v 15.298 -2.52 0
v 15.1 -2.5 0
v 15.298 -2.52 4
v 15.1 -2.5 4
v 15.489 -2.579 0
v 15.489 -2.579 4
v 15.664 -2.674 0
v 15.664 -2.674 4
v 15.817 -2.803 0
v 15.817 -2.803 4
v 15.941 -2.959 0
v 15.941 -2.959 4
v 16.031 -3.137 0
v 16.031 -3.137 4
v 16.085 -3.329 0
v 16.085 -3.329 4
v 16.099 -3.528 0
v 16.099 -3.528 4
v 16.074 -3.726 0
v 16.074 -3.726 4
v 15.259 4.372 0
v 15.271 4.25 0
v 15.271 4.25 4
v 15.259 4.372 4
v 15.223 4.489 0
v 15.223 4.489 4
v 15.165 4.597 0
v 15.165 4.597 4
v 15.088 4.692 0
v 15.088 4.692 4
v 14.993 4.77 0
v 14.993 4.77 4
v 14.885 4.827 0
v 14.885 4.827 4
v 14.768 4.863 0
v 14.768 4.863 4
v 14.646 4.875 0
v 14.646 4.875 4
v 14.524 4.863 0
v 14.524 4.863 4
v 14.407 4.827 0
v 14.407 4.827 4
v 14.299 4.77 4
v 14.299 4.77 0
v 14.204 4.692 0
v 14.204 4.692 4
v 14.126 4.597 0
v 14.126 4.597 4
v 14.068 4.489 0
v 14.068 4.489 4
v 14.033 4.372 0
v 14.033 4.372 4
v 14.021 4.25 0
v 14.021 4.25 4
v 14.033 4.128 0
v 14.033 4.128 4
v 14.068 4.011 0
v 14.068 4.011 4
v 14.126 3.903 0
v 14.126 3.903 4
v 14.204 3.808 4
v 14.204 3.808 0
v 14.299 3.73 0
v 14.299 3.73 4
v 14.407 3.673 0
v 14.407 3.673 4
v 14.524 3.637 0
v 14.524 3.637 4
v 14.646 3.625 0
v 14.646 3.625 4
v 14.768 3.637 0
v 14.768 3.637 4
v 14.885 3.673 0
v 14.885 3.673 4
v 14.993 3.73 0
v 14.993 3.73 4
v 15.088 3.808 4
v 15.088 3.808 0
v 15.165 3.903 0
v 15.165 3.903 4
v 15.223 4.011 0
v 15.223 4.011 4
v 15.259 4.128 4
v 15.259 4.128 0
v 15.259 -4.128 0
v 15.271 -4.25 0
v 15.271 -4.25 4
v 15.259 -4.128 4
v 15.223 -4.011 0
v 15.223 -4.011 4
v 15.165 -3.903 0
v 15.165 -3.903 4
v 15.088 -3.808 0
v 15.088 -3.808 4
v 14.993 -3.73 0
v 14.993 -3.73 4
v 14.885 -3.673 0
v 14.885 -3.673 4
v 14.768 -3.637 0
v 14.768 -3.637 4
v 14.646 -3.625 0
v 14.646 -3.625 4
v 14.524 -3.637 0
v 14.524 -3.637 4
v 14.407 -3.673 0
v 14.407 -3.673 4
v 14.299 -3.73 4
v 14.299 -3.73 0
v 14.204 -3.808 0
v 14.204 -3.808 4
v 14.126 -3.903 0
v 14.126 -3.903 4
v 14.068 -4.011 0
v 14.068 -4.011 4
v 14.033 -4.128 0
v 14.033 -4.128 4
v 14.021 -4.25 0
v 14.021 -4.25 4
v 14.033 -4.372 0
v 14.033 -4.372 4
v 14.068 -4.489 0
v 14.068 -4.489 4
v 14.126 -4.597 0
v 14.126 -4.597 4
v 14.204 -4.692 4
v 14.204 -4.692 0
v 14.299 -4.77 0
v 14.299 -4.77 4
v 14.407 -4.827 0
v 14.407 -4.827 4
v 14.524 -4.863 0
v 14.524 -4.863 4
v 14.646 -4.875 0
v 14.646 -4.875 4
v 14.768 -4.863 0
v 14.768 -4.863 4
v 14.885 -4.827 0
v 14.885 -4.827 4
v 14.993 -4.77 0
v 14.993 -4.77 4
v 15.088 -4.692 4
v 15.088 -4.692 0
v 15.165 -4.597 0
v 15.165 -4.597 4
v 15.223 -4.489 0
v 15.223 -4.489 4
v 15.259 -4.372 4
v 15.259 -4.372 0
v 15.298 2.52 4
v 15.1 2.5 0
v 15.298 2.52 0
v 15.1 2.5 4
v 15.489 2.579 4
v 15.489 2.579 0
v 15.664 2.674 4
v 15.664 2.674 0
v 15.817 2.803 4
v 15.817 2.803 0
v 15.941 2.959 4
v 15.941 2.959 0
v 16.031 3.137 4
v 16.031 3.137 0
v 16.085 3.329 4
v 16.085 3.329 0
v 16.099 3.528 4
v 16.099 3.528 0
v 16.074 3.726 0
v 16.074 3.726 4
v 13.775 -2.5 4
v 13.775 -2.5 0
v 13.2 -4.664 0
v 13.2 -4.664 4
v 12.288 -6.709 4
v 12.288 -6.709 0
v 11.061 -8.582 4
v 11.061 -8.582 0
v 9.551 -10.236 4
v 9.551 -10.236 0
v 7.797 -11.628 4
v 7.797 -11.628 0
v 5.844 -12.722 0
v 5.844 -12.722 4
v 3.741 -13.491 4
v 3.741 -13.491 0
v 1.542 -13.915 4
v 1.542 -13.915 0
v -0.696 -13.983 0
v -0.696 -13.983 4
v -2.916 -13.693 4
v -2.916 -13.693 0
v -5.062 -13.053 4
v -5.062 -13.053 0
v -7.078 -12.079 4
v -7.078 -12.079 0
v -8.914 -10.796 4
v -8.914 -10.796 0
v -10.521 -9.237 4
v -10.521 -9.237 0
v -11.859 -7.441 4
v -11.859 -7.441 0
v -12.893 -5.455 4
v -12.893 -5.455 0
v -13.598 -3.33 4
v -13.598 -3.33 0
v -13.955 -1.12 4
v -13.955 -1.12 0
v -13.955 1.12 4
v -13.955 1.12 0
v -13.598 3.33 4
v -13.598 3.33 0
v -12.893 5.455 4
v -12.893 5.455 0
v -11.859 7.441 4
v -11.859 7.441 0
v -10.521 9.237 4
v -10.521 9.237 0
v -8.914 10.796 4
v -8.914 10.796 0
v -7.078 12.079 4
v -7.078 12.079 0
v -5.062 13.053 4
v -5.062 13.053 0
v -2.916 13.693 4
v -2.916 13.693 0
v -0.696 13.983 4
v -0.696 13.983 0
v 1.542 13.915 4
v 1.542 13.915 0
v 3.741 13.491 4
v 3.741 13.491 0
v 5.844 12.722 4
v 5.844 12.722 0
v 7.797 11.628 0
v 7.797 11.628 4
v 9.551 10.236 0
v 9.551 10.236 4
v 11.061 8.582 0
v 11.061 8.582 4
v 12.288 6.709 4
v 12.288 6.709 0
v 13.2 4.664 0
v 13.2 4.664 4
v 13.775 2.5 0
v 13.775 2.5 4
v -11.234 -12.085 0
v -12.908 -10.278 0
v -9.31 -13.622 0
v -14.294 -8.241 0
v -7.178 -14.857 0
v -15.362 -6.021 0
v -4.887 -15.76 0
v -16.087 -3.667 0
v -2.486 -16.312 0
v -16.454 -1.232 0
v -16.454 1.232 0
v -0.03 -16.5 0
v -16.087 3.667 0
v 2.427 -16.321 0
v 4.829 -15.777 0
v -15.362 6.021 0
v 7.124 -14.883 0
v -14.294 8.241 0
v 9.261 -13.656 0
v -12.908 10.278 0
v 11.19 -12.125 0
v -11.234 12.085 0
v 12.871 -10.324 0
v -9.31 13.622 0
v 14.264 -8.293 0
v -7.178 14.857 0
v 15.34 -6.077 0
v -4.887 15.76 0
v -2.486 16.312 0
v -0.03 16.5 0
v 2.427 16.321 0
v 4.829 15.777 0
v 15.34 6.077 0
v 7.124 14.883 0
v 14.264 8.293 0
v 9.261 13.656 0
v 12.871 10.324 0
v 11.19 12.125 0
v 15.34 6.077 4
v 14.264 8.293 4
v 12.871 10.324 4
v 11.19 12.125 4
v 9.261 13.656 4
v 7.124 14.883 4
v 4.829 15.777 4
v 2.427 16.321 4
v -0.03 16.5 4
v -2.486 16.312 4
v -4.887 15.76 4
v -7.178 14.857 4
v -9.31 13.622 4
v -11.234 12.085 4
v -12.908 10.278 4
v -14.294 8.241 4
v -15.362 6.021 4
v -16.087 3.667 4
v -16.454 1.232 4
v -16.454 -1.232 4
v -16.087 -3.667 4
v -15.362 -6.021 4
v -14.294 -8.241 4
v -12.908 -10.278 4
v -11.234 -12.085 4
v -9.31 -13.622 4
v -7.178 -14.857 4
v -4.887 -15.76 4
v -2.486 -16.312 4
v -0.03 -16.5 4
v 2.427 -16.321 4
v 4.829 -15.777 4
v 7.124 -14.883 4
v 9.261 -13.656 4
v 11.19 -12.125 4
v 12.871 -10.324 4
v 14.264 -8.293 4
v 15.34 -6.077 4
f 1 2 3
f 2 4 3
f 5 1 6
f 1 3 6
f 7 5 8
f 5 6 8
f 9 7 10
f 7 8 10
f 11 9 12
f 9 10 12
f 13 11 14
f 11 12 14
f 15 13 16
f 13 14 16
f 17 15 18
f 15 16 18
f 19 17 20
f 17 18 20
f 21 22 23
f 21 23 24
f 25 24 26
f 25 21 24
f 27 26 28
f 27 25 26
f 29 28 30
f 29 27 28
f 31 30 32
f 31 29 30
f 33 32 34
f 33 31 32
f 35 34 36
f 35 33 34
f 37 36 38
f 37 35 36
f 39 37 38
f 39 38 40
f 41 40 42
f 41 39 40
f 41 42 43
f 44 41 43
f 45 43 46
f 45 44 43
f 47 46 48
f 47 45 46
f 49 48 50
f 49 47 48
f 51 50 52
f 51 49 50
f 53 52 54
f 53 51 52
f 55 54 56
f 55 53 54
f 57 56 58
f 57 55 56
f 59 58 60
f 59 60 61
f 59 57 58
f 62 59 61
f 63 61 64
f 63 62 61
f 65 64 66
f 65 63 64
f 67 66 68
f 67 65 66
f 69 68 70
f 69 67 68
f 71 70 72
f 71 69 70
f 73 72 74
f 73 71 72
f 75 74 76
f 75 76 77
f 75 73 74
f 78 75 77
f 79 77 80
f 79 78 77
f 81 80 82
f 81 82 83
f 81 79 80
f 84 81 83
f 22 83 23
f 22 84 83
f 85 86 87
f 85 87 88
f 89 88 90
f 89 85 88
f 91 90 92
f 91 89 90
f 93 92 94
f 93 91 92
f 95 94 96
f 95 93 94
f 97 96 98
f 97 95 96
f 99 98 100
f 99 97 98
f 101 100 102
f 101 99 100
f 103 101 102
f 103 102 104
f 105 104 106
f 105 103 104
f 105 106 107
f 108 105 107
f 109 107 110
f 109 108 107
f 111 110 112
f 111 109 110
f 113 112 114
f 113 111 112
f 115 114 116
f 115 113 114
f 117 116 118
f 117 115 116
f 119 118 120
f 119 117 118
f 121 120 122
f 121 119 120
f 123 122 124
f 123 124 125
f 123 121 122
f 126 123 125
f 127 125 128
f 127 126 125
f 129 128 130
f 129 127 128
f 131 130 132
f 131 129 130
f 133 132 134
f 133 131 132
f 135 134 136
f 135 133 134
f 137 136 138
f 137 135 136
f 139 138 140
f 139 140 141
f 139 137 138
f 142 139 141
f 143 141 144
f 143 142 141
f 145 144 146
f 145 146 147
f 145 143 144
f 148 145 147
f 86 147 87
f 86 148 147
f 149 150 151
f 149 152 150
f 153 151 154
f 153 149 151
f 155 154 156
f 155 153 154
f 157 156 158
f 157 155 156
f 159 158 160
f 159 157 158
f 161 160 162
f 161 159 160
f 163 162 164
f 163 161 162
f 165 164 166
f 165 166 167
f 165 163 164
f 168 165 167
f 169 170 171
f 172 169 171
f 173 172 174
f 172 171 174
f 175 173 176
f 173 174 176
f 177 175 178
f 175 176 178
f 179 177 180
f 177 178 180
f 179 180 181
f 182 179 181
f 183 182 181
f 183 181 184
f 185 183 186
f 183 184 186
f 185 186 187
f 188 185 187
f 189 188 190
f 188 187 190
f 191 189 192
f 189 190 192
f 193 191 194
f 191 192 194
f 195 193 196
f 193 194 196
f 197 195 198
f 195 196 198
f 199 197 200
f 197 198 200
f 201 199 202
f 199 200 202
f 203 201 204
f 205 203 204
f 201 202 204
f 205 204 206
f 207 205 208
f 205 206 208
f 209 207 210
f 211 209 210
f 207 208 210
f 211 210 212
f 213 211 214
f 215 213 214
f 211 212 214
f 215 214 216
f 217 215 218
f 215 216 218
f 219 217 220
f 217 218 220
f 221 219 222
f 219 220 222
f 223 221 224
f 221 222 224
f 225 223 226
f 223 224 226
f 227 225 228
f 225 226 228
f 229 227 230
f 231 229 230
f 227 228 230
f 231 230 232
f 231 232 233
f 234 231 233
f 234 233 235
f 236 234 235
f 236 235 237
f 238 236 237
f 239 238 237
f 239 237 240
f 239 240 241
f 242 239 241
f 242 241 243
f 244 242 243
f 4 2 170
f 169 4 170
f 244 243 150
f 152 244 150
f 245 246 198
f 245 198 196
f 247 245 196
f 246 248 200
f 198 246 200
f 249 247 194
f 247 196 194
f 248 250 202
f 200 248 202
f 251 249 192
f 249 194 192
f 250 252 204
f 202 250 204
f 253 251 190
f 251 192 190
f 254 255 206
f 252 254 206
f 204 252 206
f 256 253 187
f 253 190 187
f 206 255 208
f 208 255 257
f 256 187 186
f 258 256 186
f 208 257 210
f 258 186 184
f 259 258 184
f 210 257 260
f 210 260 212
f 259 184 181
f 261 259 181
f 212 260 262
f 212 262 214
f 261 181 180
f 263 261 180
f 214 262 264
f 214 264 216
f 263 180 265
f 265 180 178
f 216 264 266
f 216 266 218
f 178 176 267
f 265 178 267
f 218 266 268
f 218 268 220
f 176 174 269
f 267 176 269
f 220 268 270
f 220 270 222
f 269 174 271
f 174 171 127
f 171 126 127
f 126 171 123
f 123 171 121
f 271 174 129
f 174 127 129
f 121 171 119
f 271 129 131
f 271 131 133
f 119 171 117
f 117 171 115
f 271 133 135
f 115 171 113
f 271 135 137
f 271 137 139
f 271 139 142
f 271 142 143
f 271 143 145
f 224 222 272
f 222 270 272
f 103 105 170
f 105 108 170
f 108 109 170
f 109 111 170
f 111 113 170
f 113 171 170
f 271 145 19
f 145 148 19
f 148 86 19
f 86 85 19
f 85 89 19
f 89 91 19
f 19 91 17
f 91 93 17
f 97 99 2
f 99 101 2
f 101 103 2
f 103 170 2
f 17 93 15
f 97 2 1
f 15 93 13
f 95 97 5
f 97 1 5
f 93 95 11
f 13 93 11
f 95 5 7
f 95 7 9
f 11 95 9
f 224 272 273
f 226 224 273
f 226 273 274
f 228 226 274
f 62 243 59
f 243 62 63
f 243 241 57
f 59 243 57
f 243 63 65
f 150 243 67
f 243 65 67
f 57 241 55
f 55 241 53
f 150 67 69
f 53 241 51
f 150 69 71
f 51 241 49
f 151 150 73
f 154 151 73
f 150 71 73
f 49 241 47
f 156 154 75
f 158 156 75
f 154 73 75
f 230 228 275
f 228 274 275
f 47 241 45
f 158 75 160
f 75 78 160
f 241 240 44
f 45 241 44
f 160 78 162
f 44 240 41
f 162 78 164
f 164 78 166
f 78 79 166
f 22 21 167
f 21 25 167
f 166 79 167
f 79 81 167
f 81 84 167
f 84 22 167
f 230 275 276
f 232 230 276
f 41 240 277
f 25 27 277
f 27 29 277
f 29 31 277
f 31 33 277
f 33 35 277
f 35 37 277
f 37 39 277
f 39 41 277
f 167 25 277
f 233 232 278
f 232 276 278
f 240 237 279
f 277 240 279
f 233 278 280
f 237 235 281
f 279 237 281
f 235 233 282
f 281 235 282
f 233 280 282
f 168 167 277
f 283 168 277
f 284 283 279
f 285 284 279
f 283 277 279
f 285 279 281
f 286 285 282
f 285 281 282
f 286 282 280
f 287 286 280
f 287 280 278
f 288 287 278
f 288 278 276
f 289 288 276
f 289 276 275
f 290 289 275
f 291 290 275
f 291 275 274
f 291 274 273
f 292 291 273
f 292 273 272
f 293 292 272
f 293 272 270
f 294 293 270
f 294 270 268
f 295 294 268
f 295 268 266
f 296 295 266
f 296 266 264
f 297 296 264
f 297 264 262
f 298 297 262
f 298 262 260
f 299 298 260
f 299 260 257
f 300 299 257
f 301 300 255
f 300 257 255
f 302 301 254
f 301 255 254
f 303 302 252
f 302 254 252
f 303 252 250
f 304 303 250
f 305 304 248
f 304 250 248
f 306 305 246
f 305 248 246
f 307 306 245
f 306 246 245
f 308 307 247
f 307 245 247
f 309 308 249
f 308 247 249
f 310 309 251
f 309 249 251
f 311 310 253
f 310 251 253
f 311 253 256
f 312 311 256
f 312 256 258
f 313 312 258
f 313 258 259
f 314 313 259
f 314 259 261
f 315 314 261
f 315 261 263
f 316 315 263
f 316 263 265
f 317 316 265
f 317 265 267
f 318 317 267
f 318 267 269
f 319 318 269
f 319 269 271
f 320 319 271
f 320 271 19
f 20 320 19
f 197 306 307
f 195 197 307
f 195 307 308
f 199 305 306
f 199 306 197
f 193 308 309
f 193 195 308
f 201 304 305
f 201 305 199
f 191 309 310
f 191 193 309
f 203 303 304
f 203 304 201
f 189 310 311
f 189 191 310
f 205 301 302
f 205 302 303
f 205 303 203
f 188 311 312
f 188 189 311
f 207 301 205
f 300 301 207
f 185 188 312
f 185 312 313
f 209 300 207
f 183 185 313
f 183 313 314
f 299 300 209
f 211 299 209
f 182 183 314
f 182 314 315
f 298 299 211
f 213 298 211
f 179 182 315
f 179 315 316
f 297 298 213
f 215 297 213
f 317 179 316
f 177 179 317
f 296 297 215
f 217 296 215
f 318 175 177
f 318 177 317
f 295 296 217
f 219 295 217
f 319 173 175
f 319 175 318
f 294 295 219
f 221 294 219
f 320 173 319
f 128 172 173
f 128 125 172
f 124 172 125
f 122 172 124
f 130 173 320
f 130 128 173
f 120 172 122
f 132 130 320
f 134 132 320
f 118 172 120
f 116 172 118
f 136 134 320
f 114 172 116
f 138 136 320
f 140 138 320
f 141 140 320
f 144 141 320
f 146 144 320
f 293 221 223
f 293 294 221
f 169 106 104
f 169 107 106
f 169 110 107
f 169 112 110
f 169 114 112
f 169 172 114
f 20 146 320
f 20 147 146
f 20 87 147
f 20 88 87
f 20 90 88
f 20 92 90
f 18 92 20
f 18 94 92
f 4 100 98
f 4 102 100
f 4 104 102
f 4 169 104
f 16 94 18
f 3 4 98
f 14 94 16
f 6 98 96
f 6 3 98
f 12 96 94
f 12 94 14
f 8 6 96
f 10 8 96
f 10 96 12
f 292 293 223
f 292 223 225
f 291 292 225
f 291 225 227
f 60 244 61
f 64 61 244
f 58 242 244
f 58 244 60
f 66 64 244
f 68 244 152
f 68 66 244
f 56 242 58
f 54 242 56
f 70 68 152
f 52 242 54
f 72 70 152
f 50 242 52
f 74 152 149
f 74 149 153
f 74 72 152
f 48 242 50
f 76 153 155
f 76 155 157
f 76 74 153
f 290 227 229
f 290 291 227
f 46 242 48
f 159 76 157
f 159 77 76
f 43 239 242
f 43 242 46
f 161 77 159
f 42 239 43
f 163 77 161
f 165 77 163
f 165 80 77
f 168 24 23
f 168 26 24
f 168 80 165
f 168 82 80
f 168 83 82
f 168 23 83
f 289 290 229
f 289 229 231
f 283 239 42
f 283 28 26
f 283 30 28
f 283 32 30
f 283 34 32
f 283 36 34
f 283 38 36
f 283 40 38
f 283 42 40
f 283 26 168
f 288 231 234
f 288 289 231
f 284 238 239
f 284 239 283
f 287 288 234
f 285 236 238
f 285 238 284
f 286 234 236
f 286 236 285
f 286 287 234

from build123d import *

# Parameters (mm, degrees)
F0_R     = 0.625
F1_DEPTH = 4
F2_R     = 1


with BuildPart() as f1:
    # F0 (on Top) → F1 (new body)
    with BuildSketch(Plane.XY):
        with BuildLine():
            ThreePointArc((13.774977, -2.5), (-14, 0), (13.774977, 2.5))
            Line((13.774977, 2.5), (16.309506, 2.5))
            ThreePointArc((16.309506, 2.5), (-16.5, 0), (16.309506, -2.5))
            Line((16.309506, -2.5), (13.774977, -2.5))
        make_face()
        with Locations((14.645819, -4.25)):
            Circle(F0_R, mode=Mode.SUBTRACT)
        with Locations((14.645819, 4.25)):
            Circle(F0_R, mode=Mode.SUBTRACT)
    extrude(amount=F1_DEPTH)

    # F2
    f2_edges = [f1.edges().sort_by_distance(p)[0] for p in [
        (16.309506, 2.5, 2),
        (16.309506, -2.5, 2),
    ]]
    fillet(f2_edges, radius=F2_R)


solid = f1.part
